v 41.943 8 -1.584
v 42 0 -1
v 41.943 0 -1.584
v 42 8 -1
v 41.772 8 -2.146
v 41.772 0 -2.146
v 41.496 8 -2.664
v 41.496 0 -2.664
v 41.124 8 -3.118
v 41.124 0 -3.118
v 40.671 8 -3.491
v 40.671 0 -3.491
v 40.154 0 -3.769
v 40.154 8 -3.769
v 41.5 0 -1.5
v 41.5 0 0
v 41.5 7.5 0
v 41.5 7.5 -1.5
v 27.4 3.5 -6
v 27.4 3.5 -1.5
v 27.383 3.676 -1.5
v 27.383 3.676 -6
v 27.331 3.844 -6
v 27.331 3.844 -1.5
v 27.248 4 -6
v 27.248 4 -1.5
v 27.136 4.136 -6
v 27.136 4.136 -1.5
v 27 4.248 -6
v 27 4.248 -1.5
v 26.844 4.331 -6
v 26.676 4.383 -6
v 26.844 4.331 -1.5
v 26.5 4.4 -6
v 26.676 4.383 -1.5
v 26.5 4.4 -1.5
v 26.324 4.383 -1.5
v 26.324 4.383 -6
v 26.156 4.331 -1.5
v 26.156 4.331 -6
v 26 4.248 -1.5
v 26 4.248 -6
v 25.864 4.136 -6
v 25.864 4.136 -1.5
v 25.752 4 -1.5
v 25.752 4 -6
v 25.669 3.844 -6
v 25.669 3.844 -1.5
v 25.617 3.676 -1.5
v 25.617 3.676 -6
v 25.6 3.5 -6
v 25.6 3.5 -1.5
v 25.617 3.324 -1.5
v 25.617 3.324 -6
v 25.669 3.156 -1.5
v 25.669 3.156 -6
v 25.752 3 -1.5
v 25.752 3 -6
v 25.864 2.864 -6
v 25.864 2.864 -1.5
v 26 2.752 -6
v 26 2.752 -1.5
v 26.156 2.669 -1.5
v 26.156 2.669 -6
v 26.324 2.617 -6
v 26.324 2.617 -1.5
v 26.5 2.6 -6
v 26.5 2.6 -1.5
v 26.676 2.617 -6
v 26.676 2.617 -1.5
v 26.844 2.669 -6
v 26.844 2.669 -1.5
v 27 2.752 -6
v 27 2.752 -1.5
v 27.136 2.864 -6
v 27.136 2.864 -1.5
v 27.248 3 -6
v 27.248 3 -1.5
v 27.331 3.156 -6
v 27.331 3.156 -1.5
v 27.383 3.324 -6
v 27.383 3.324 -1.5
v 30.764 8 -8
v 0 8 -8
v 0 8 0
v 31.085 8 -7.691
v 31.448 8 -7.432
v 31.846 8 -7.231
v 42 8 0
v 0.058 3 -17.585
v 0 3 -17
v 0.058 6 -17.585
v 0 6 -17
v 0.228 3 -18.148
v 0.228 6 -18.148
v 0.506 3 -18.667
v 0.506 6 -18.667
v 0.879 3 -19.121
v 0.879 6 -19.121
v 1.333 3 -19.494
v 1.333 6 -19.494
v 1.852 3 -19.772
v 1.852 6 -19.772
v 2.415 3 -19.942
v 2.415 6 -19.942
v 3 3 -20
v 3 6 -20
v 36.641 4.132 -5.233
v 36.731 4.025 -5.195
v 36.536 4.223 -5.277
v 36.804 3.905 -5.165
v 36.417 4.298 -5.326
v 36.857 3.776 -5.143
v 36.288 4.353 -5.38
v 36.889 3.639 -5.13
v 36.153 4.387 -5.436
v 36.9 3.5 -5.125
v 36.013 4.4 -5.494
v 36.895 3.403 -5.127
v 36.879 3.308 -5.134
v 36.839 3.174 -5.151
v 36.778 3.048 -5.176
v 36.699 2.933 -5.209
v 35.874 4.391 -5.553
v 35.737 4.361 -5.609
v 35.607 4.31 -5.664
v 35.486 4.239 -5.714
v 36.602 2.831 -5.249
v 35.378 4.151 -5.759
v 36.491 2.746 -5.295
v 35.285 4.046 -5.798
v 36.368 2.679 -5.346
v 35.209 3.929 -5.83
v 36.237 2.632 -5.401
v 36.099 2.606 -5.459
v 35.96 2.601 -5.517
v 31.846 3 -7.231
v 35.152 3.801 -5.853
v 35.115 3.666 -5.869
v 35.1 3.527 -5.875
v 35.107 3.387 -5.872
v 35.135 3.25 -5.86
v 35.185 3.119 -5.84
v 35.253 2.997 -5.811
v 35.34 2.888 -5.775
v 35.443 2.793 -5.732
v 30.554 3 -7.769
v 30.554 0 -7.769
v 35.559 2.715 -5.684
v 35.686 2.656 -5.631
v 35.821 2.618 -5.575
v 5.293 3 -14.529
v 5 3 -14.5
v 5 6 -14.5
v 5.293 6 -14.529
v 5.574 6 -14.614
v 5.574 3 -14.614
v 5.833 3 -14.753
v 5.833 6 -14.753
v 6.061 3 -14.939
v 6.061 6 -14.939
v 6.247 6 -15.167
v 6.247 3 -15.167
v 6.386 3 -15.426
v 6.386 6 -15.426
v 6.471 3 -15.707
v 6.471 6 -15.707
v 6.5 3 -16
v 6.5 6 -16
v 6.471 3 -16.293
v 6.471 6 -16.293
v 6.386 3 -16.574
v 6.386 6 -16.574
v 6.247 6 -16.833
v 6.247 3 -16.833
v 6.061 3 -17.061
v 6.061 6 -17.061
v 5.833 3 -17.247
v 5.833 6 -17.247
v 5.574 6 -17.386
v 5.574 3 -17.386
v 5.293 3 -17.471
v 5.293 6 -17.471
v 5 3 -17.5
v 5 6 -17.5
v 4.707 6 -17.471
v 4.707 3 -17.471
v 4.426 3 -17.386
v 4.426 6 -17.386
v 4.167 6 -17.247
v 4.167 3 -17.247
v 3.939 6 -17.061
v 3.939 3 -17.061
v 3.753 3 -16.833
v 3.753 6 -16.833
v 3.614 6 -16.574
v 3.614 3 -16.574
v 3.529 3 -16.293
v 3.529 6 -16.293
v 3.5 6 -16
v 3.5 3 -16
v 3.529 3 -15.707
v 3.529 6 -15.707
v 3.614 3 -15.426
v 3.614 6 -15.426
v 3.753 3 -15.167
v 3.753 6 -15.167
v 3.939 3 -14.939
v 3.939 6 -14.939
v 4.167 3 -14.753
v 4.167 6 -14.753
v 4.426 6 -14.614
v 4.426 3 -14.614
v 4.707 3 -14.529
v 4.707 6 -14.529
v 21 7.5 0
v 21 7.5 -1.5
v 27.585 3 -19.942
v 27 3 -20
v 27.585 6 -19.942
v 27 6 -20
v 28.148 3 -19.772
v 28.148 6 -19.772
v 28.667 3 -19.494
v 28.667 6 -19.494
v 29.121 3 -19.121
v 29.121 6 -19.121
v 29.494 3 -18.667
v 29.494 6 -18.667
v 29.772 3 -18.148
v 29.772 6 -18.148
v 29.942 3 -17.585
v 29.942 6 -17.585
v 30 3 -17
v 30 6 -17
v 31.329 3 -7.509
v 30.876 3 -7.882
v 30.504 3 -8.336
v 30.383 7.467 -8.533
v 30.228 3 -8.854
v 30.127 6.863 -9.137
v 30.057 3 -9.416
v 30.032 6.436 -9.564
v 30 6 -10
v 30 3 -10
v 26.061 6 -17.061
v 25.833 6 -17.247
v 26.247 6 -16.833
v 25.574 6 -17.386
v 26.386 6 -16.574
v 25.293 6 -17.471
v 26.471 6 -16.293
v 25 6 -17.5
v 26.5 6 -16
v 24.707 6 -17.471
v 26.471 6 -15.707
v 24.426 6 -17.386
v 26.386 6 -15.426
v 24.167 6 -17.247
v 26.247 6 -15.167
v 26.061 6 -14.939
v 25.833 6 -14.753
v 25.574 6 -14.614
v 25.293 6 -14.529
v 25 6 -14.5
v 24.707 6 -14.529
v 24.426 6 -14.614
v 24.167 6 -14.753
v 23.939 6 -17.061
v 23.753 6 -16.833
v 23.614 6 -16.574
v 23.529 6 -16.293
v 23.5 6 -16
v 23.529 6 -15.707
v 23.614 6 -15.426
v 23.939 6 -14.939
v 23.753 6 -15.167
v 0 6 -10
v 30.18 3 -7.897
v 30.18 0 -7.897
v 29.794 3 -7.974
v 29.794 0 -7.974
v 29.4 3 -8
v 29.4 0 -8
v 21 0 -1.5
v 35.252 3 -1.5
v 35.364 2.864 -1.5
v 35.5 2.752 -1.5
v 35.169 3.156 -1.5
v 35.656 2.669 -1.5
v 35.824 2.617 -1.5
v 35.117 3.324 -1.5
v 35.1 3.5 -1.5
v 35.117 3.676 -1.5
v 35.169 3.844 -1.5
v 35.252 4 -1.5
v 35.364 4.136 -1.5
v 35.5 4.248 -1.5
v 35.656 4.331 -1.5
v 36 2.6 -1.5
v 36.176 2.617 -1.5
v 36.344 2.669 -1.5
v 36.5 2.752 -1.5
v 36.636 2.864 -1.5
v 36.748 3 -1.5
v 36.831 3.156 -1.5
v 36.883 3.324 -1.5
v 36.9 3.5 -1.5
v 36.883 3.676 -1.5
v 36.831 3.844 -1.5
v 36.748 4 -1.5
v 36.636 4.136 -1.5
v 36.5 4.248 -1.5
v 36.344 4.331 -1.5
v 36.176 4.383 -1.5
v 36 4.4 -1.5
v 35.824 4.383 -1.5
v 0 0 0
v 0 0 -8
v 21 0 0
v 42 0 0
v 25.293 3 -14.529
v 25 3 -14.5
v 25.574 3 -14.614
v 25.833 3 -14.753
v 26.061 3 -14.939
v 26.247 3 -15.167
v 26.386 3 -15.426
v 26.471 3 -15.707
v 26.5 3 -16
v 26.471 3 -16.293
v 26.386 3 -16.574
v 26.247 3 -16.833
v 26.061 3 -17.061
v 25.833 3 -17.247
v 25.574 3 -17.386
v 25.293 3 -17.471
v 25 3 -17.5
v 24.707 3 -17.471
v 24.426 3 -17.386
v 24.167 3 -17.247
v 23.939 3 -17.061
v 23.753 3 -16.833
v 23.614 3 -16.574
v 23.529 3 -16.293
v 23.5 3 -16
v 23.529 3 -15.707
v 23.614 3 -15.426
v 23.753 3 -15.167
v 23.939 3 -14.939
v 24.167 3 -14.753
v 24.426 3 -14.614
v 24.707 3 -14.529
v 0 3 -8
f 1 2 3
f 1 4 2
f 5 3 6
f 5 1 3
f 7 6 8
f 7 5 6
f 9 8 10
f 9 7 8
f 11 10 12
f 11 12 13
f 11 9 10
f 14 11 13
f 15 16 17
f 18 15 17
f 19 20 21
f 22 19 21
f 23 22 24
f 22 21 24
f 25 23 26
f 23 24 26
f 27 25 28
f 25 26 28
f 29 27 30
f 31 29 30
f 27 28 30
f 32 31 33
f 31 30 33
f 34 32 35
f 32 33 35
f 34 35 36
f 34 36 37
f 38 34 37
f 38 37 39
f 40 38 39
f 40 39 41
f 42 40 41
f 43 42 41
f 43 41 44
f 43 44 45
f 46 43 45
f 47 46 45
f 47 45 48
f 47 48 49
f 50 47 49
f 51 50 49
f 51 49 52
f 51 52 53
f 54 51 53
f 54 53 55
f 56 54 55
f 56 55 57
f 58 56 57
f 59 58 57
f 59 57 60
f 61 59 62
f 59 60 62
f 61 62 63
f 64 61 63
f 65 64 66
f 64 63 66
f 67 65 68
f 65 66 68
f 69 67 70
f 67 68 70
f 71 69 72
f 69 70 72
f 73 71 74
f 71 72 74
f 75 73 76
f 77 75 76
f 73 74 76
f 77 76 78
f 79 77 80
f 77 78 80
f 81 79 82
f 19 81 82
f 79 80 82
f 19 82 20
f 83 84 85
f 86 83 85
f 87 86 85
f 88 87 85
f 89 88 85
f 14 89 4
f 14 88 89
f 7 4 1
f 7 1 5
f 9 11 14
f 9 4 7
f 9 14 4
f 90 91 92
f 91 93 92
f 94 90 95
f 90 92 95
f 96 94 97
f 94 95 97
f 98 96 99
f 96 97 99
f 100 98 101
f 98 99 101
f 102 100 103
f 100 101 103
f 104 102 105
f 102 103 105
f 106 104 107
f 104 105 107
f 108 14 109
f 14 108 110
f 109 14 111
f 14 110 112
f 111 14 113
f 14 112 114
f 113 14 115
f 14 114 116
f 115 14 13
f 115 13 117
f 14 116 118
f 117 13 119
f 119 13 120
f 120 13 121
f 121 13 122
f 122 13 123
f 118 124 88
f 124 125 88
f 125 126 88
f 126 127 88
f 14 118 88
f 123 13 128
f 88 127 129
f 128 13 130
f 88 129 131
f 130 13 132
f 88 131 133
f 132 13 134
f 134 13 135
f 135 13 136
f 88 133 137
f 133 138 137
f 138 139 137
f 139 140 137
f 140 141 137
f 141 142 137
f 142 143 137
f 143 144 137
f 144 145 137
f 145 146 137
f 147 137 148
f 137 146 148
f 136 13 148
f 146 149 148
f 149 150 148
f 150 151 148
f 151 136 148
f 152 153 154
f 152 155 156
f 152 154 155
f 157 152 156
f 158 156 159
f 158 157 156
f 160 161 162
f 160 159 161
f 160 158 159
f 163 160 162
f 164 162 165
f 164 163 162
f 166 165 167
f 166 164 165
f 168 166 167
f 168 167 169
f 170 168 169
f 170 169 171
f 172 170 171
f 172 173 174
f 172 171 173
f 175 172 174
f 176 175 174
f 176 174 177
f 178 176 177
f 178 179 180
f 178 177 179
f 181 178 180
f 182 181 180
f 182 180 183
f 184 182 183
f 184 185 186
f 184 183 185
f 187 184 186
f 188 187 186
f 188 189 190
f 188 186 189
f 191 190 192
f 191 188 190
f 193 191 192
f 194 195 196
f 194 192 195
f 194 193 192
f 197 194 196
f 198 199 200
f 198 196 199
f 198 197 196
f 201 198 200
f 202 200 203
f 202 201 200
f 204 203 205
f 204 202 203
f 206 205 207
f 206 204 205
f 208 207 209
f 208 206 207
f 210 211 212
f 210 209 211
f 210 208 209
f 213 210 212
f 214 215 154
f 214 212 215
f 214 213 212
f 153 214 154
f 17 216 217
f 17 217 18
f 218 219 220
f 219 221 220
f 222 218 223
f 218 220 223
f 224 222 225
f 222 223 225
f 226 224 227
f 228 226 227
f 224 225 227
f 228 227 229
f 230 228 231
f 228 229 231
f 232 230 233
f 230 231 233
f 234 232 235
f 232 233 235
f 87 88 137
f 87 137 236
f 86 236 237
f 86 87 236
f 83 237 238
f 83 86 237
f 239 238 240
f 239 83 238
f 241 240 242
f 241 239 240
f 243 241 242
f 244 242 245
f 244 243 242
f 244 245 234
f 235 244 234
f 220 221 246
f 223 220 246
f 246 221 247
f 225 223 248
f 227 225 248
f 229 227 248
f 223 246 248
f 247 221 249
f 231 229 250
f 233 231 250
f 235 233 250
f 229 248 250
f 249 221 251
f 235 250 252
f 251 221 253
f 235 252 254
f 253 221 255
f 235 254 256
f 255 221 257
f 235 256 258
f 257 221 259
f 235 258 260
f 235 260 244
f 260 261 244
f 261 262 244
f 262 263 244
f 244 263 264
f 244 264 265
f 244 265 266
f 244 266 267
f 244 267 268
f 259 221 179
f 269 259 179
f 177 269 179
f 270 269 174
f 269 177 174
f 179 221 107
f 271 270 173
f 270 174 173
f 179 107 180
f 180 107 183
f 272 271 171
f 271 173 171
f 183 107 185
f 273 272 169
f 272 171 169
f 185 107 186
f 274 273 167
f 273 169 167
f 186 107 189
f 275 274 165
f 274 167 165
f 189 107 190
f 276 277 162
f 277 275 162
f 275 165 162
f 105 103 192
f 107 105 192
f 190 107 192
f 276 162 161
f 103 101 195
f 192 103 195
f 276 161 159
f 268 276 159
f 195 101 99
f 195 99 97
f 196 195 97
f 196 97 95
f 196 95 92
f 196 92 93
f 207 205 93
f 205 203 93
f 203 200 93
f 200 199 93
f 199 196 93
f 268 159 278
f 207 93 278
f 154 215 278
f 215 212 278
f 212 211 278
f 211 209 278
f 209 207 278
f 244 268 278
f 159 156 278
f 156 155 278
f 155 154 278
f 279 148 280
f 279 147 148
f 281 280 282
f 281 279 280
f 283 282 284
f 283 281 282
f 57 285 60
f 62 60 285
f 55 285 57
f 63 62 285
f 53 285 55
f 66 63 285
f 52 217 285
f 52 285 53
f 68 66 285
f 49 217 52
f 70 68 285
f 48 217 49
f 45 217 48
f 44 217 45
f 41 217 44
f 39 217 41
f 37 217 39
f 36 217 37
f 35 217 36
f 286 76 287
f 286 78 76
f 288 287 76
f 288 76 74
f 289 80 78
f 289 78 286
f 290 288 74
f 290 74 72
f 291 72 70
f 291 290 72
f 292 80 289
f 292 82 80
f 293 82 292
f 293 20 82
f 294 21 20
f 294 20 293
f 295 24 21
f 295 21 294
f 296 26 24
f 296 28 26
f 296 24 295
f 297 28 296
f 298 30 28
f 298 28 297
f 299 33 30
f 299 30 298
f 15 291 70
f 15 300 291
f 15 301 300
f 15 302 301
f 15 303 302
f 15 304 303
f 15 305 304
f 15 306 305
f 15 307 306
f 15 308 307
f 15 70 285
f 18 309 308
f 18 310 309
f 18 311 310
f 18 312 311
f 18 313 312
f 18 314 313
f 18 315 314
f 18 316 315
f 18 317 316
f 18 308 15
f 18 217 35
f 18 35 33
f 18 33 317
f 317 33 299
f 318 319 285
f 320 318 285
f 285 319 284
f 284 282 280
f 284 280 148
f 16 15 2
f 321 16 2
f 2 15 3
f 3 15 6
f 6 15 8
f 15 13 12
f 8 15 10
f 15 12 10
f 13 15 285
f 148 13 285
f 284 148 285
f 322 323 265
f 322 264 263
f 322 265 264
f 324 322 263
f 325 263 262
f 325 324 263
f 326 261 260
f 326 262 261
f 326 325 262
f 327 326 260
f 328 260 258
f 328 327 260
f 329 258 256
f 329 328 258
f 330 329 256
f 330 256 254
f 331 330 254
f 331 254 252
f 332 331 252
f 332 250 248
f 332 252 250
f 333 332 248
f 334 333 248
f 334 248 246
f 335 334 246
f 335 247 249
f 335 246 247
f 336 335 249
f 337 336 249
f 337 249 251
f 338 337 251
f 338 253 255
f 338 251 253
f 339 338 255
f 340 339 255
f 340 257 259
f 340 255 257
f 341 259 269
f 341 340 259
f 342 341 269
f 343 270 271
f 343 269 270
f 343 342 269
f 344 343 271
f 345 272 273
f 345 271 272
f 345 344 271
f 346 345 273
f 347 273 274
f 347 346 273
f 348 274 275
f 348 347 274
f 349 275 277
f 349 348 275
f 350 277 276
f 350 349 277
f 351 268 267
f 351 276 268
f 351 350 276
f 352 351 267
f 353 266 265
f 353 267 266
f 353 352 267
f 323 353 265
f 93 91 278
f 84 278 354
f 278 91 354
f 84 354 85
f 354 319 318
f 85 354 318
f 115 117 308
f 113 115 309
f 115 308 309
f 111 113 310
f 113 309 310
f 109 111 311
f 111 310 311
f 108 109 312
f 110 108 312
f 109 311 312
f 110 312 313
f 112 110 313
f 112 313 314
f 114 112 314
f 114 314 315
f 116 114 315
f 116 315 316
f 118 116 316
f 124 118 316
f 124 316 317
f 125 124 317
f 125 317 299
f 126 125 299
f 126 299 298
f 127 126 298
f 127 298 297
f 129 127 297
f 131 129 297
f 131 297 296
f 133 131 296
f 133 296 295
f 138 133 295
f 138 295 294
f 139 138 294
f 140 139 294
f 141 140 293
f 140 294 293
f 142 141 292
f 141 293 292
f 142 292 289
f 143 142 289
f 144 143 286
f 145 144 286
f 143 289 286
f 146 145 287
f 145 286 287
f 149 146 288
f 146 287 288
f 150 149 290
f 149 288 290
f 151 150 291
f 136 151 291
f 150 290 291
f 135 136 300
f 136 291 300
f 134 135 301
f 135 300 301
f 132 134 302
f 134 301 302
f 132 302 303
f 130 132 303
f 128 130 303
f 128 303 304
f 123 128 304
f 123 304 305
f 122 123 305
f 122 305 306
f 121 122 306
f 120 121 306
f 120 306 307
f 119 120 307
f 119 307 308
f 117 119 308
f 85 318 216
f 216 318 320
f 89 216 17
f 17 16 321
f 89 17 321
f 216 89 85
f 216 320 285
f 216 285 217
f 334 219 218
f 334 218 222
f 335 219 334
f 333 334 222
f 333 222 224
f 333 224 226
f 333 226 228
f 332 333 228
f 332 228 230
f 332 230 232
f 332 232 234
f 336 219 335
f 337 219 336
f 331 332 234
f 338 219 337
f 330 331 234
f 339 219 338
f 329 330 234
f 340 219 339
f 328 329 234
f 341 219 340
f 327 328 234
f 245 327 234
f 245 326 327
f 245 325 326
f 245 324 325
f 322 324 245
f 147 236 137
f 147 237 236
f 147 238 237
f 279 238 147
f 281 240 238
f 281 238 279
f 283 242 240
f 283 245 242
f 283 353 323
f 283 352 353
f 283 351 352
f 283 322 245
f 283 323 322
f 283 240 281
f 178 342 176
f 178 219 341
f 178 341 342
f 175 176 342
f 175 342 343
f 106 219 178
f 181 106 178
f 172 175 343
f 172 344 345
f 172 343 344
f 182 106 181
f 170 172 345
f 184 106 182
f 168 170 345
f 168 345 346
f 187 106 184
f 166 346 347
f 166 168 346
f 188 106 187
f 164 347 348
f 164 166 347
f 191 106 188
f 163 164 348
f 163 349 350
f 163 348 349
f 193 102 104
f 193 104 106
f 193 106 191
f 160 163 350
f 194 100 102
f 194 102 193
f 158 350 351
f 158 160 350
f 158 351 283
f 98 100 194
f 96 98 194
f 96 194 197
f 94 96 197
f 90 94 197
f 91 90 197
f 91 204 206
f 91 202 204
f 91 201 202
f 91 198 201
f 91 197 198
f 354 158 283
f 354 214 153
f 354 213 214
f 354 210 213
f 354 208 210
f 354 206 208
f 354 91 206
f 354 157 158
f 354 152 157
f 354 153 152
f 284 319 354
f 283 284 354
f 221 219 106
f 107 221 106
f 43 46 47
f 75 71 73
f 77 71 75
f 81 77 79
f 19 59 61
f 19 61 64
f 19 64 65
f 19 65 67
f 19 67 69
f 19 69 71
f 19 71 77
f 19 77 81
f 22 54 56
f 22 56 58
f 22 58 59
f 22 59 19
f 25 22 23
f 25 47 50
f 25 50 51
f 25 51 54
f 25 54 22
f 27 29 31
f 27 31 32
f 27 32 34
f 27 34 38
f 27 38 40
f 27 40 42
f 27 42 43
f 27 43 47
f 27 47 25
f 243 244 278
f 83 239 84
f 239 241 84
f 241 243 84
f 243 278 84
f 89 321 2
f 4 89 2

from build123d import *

# Parameters (mm, degrees)
SKETCH_1_R          = 1.5
EXTRUDE_1_DEPTH     = 8
SKETCH_2_W          = 12
SKETCH_2_H          = 3
CUT_EXTRUDE_1_DEPTH = 48.201694885
SKETCH_3_R          = 0.9
CUT_EXTRUDE_2_DEPTH = 6
SKETCH_4_W          = 20.5
SKETCH_4_H          = 7.5
CUT_EXTRUDE_3_DEPTH = 1.5
FILLET_2_R          = 3
FILLET_3_R          = 3


with BuildPart() as part:
    # 草图1 → 凸台-拉伸1 (new body)
    with BuildSketch(Plane(origin=(0, 0, 0), x_dir=(1, 0, 0), z_dir=(0, 1, 0))):
        Polygon((0, 0), (42, 0), (42, 3), (30, 8), (30, 20), (0, 20), align=None)
        with Locations(Location((25, 16, 0), (0, 0, 270))):
            Circle(SKETCH_1_R, mode=Mode.SUBTRACT)
        with Locations(Location((5, 16, 0), (0, 0, 270))):
            Circle(SKETCH_1_R, mode=Mode.SUBTRACT)
    extrude(amount=EXTRUDE_1_DEPTH)

    # 草图2 → 切除-拉伸1 (cut, through all)
    with BuildSketch(Plane.ZY):
        Polygon((-20, 6), (-10, 6), (-8, 8), (-20, 8), align=None)
        with Locations((-14, 1.5)):
            Rectangle(SKETCH_2_W, SKETCH_2_H)
    extrude(amount=-CUT_EXTRUDE_1_DEPTH, mode=Mode.SUBTRACT)

    # 草图3 → 切除-拉伸2 (cut)
    with BuildSketch(Plane.XY):
        with Locations((26.5, 3.5)):
            Circle(SKETCH_3_R)
        with Locations((36, 3.5)):
            Circle(SKETCH_3_R)
    extrude(amount=-CUT_EXTRUDE_2_DEPTH, mode=Mode.SUBTRACT)

    # 草图4 → 切除-拉伸3 (cut)
    with BuildSketch(Plane.XY):
        with Locations((31.25, 3.75)):
            Rectangle(SKETCH_4_W, SKETCH_4_H)
    extrude(amount=-CUT_EXTRUDE_3_DEPTH, mode=Mode.SUBTRACT)

    # 圆角2
    fillet_2_edges = [part.edges().sort_by_distance(p)[0] for p in [
        (0, 4.5, -20),
        (30, 4.5, -20),
        (42, 4, -3),
        (30, 5.5, -8),
    ]]
    fillet(fillet_2_edges, radius=FILLET_2_R)

    # 圆角3
    fillet_3_edges = [part.edges().sort_by_distance(p)[0] for p in [
        (30, 1.5, -8),
    ]]
    fillet(fillet_3_edges, radius=FILLET_3_R)


solid = part.part
